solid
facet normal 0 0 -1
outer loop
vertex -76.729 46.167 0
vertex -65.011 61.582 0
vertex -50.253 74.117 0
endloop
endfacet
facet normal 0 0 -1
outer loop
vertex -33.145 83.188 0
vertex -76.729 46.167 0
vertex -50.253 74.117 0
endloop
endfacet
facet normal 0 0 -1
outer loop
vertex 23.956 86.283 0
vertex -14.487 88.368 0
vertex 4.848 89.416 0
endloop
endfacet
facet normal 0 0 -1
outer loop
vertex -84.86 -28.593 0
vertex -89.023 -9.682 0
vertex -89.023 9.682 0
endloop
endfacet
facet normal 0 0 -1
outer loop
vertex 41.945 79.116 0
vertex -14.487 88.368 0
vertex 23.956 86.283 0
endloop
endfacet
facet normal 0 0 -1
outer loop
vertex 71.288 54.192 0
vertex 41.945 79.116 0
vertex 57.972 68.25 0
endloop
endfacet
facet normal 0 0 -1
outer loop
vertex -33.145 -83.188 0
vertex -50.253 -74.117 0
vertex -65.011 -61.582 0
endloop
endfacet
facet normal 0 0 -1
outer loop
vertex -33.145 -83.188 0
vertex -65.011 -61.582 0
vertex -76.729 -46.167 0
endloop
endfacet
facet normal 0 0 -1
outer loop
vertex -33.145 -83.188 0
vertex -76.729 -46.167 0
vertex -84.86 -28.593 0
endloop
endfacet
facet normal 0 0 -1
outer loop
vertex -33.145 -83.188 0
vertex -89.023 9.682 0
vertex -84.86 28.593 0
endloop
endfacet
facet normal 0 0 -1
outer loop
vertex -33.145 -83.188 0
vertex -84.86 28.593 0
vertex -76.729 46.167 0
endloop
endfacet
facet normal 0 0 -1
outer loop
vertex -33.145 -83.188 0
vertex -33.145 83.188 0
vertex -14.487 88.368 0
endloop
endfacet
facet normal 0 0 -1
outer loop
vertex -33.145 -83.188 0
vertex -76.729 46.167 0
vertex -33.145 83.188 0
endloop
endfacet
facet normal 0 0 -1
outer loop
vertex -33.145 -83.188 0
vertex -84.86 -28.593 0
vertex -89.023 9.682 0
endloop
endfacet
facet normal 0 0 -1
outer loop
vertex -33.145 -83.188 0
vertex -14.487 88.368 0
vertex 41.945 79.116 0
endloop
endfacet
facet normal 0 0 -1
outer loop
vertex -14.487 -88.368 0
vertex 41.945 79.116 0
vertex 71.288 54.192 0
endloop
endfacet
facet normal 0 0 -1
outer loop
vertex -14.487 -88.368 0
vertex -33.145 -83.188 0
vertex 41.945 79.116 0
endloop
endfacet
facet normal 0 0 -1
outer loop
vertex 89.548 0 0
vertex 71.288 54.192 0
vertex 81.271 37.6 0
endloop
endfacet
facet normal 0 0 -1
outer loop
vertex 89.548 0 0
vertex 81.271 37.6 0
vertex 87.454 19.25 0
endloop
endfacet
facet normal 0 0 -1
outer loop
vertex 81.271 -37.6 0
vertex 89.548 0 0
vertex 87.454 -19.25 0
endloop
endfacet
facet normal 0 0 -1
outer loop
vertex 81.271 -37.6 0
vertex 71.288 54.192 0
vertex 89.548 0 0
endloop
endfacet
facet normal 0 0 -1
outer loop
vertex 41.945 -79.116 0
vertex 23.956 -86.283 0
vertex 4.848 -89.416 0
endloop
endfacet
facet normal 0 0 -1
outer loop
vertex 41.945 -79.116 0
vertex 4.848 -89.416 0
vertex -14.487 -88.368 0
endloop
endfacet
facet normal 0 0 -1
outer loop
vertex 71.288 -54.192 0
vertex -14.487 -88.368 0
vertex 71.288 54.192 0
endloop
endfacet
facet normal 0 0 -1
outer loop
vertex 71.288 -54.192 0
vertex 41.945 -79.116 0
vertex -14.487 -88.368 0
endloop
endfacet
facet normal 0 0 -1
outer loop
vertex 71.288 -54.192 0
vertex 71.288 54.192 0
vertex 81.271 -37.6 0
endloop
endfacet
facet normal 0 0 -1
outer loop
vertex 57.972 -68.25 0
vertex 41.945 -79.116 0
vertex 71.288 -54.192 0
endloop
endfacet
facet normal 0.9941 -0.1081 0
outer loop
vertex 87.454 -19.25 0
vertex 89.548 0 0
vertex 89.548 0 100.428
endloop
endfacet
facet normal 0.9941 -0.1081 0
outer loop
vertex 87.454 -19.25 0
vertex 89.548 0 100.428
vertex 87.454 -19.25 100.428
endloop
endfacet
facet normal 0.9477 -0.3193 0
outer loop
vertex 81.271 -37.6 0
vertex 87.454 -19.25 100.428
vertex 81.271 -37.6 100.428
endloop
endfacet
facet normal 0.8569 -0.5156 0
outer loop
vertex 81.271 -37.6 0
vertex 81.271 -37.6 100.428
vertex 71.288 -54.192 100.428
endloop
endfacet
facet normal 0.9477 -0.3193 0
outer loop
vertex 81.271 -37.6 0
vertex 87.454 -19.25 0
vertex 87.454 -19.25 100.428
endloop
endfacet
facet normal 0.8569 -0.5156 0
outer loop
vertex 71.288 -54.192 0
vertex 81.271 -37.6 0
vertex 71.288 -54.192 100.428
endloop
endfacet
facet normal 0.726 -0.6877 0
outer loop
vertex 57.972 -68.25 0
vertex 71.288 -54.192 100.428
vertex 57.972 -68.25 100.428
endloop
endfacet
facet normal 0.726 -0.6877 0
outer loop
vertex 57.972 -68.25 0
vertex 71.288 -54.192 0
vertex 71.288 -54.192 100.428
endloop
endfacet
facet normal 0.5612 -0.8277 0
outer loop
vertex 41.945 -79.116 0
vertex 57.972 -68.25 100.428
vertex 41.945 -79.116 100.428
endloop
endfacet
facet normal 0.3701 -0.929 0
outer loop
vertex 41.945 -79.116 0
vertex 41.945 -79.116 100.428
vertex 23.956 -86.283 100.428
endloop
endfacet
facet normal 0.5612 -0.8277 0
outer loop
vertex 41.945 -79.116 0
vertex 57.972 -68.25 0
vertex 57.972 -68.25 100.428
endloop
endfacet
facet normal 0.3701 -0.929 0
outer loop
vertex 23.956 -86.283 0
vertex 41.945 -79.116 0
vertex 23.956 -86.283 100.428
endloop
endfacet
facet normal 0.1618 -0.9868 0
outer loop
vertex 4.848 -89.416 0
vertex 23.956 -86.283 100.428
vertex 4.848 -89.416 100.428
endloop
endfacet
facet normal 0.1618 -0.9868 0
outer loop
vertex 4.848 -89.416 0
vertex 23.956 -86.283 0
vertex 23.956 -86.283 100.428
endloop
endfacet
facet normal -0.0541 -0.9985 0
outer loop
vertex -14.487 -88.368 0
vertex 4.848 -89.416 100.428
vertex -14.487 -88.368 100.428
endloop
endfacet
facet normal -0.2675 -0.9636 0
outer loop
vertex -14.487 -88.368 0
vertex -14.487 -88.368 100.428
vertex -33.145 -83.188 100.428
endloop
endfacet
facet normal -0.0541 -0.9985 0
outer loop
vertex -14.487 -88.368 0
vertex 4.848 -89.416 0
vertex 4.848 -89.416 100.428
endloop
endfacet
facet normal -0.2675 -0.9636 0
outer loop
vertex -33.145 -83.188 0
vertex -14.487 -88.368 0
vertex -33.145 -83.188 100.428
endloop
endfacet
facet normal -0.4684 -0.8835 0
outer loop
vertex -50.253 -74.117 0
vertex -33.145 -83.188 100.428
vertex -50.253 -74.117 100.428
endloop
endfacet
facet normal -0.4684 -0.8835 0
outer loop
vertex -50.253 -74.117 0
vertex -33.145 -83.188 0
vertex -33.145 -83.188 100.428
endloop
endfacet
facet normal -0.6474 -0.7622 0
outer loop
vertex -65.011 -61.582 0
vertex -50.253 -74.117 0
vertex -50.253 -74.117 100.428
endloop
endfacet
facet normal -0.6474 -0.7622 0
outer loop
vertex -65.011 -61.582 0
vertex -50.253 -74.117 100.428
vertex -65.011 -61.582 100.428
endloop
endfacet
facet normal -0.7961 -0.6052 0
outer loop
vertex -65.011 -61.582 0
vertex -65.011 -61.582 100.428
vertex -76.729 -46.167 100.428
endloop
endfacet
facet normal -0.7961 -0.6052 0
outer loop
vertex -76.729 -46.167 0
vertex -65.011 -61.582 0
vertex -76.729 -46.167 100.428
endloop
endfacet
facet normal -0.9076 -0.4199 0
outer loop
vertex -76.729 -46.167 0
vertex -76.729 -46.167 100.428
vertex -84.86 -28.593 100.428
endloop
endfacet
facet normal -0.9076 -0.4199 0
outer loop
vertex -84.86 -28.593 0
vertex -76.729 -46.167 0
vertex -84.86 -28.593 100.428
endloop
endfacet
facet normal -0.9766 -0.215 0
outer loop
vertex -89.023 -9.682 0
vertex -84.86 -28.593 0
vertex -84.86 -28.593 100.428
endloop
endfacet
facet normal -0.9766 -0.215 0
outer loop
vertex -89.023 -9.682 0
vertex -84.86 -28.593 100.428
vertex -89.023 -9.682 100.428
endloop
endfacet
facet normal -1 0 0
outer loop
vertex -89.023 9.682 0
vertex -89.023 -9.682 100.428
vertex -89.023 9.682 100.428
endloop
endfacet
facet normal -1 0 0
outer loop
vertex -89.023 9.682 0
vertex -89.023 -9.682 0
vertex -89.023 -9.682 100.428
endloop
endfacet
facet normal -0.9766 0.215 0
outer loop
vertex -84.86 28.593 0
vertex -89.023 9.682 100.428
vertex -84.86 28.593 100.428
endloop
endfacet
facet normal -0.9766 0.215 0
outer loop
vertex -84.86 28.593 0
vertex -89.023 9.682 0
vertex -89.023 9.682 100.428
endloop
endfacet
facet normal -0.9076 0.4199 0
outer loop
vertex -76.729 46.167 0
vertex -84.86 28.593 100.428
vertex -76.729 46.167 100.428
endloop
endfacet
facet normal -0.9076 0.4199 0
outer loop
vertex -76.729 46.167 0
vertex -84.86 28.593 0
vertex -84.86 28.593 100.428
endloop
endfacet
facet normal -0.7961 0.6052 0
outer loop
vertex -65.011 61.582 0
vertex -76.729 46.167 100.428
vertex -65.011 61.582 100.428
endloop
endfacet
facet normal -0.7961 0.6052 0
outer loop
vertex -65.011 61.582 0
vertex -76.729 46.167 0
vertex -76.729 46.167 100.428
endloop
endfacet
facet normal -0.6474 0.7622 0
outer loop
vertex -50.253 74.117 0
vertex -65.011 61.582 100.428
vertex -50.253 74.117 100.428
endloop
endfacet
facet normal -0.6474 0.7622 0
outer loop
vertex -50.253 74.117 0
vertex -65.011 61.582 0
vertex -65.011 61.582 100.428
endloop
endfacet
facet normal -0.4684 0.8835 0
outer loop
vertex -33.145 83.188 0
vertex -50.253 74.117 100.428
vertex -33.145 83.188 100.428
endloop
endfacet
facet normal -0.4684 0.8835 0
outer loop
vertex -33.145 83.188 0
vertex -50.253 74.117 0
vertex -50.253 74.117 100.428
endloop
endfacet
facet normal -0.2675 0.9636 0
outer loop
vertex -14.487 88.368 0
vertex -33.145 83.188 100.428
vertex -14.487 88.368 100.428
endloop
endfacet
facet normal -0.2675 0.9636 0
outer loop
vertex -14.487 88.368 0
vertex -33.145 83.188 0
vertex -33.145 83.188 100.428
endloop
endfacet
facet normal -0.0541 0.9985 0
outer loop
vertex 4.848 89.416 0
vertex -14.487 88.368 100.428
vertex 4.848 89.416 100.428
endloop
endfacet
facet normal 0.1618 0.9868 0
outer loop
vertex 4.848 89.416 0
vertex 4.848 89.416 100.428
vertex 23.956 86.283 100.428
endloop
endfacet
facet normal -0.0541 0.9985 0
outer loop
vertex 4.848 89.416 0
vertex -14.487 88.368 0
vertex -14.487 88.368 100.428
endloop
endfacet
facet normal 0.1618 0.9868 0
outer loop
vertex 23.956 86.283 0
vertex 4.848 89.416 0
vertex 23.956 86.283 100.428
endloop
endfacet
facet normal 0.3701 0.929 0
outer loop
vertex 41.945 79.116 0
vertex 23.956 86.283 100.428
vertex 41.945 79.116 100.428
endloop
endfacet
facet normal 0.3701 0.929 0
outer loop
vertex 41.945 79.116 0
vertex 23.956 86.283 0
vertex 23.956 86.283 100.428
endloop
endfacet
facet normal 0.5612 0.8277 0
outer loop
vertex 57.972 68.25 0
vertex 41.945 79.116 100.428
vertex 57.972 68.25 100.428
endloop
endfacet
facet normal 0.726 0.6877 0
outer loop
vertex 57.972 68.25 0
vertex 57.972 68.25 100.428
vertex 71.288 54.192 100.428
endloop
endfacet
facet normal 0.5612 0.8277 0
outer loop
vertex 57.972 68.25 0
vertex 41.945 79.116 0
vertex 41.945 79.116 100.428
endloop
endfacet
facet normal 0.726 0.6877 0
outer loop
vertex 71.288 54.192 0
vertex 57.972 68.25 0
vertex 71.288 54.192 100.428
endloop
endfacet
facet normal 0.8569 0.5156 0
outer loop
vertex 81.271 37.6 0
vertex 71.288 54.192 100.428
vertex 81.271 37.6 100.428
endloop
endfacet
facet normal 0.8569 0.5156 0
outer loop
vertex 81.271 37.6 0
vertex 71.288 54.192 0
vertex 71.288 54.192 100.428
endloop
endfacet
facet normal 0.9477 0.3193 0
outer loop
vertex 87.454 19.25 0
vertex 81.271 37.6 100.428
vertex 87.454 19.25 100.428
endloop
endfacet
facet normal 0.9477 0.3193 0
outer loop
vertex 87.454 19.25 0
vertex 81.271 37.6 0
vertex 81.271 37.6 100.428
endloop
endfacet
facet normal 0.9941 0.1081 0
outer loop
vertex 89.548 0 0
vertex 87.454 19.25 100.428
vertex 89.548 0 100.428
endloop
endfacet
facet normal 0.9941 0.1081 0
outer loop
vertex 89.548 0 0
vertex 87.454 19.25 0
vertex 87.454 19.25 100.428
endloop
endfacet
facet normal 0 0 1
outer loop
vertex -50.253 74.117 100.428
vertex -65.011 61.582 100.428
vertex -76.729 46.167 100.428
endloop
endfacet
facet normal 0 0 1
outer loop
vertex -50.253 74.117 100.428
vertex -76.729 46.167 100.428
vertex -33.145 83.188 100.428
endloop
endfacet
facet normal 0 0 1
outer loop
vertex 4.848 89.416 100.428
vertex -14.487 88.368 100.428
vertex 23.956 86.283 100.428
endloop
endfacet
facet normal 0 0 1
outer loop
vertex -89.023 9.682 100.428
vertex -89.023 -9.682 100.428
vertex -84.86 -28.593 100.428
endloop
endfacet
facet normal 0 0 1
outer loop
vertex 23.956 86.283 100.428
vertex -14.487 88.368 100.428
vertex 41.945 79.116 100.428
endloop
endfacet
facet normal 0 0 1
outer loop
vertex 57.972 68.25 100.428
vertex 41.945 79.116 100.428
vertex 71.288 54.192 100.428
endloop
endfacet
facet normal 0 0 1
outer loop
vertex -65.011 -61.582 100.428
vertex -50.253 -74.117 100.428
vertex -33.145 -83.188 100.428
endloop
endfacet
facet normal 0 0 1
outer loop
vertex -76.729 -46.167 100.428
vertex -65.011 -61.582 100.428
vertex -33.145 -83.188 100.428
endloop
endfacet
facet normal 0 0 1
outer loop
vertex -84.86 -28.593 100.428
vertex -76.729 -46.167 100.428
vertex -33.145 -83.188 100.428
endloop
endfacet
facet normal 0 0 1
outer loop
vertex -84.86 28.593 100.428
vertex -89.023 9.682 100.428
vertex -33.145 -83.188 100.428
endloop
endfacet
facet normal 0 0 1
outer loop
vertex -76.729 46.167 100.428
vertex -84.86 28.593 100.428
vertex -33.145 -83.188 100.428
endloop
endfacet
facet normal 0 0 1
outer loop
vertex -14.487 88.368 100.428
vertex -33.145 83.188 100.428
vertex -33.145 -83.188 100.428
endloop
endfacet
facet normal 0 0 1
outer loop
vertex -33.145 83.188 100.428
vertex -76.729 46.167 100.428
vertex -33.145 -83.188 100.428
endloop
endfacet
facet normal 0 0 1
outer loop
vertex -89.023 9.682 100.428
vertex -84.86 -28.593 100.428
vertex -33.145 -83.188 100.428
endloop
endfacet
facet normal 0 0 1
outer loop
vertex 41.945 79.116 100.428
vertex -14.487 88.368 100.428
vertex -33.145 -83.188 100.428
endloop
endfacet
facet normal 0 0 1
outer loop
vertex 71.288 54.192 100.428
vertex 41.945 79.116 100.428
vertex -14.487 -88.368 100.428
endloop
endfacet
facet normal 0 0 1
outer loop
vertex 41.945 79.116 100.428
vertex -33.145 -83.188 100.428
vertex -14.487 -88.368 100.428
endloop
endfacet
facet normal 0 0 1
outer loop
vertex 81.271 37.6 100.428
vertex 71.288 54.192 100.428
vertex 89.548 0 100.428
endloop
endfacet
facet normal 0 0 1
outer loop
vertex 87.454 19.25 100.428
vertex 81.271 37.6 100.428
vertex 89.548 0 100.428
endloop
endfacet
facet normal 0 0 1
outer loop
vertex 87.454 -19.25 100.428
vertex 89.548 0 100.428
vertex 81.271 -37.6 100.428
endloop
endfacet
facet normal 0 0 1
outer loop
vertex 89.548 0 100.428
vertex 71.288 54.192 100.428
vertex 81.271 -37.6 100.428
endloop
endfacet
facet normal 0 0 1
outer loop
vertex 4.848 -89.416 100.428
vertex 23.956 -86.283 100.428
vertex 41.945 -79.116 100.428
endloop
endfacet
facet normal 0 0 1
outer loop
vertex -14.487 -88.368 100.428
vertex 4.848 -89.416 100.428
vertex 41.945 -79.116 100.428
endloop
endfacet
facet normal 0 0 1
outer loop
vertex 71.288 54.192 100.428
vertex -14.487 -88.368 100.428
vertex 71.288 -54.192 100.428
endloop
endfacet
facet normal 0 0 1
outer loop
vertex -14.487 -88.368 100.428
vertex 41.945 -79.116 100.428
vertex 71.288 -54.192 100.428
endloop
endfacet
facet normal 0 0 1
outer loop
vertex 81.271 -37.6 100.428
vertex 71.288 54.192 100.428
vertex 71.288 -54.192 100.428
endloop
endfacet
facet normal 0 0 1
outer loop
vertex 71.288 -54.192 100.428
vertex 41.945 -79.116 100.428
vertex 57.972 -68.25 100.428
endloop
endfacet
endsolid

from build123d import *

# Parameters (mm, degrees)
F0_R      = 93.952715
F1_DEPTH  = 381
F1_FACE_R = 93.952715
F2_DEPTH  = 76.2
F3_R      = 89.547505
F4_DEPTH  = 100.42847


with BuildPart() as f1:
    # F0 (on Top) → F1 (new body)
    with BuildSketch(Plane.XY):
        Circle(F0_R)
    extrude(amount=F1_DEPTH)

    # F1_face (on face) → F2 (cut)
    with BuildSketch(Plane.XY.offset(381)):
        Circle(F1_FACE_R)
    extrude(amount=-F2_DEPTH, mode=Mode.SUBTRACT)

    # F3 (on face) → F4 (intersect)
    with BuildSketch(Plane(origin=(0, 0, 0), x_dir=(1, 0, 0), z_dir=(0, 0, -1))):
        Circle(F3_R)
    extrude(amount=-F4_DEPTH, mode=Mode.INTERSECT)


solid = f1.part
